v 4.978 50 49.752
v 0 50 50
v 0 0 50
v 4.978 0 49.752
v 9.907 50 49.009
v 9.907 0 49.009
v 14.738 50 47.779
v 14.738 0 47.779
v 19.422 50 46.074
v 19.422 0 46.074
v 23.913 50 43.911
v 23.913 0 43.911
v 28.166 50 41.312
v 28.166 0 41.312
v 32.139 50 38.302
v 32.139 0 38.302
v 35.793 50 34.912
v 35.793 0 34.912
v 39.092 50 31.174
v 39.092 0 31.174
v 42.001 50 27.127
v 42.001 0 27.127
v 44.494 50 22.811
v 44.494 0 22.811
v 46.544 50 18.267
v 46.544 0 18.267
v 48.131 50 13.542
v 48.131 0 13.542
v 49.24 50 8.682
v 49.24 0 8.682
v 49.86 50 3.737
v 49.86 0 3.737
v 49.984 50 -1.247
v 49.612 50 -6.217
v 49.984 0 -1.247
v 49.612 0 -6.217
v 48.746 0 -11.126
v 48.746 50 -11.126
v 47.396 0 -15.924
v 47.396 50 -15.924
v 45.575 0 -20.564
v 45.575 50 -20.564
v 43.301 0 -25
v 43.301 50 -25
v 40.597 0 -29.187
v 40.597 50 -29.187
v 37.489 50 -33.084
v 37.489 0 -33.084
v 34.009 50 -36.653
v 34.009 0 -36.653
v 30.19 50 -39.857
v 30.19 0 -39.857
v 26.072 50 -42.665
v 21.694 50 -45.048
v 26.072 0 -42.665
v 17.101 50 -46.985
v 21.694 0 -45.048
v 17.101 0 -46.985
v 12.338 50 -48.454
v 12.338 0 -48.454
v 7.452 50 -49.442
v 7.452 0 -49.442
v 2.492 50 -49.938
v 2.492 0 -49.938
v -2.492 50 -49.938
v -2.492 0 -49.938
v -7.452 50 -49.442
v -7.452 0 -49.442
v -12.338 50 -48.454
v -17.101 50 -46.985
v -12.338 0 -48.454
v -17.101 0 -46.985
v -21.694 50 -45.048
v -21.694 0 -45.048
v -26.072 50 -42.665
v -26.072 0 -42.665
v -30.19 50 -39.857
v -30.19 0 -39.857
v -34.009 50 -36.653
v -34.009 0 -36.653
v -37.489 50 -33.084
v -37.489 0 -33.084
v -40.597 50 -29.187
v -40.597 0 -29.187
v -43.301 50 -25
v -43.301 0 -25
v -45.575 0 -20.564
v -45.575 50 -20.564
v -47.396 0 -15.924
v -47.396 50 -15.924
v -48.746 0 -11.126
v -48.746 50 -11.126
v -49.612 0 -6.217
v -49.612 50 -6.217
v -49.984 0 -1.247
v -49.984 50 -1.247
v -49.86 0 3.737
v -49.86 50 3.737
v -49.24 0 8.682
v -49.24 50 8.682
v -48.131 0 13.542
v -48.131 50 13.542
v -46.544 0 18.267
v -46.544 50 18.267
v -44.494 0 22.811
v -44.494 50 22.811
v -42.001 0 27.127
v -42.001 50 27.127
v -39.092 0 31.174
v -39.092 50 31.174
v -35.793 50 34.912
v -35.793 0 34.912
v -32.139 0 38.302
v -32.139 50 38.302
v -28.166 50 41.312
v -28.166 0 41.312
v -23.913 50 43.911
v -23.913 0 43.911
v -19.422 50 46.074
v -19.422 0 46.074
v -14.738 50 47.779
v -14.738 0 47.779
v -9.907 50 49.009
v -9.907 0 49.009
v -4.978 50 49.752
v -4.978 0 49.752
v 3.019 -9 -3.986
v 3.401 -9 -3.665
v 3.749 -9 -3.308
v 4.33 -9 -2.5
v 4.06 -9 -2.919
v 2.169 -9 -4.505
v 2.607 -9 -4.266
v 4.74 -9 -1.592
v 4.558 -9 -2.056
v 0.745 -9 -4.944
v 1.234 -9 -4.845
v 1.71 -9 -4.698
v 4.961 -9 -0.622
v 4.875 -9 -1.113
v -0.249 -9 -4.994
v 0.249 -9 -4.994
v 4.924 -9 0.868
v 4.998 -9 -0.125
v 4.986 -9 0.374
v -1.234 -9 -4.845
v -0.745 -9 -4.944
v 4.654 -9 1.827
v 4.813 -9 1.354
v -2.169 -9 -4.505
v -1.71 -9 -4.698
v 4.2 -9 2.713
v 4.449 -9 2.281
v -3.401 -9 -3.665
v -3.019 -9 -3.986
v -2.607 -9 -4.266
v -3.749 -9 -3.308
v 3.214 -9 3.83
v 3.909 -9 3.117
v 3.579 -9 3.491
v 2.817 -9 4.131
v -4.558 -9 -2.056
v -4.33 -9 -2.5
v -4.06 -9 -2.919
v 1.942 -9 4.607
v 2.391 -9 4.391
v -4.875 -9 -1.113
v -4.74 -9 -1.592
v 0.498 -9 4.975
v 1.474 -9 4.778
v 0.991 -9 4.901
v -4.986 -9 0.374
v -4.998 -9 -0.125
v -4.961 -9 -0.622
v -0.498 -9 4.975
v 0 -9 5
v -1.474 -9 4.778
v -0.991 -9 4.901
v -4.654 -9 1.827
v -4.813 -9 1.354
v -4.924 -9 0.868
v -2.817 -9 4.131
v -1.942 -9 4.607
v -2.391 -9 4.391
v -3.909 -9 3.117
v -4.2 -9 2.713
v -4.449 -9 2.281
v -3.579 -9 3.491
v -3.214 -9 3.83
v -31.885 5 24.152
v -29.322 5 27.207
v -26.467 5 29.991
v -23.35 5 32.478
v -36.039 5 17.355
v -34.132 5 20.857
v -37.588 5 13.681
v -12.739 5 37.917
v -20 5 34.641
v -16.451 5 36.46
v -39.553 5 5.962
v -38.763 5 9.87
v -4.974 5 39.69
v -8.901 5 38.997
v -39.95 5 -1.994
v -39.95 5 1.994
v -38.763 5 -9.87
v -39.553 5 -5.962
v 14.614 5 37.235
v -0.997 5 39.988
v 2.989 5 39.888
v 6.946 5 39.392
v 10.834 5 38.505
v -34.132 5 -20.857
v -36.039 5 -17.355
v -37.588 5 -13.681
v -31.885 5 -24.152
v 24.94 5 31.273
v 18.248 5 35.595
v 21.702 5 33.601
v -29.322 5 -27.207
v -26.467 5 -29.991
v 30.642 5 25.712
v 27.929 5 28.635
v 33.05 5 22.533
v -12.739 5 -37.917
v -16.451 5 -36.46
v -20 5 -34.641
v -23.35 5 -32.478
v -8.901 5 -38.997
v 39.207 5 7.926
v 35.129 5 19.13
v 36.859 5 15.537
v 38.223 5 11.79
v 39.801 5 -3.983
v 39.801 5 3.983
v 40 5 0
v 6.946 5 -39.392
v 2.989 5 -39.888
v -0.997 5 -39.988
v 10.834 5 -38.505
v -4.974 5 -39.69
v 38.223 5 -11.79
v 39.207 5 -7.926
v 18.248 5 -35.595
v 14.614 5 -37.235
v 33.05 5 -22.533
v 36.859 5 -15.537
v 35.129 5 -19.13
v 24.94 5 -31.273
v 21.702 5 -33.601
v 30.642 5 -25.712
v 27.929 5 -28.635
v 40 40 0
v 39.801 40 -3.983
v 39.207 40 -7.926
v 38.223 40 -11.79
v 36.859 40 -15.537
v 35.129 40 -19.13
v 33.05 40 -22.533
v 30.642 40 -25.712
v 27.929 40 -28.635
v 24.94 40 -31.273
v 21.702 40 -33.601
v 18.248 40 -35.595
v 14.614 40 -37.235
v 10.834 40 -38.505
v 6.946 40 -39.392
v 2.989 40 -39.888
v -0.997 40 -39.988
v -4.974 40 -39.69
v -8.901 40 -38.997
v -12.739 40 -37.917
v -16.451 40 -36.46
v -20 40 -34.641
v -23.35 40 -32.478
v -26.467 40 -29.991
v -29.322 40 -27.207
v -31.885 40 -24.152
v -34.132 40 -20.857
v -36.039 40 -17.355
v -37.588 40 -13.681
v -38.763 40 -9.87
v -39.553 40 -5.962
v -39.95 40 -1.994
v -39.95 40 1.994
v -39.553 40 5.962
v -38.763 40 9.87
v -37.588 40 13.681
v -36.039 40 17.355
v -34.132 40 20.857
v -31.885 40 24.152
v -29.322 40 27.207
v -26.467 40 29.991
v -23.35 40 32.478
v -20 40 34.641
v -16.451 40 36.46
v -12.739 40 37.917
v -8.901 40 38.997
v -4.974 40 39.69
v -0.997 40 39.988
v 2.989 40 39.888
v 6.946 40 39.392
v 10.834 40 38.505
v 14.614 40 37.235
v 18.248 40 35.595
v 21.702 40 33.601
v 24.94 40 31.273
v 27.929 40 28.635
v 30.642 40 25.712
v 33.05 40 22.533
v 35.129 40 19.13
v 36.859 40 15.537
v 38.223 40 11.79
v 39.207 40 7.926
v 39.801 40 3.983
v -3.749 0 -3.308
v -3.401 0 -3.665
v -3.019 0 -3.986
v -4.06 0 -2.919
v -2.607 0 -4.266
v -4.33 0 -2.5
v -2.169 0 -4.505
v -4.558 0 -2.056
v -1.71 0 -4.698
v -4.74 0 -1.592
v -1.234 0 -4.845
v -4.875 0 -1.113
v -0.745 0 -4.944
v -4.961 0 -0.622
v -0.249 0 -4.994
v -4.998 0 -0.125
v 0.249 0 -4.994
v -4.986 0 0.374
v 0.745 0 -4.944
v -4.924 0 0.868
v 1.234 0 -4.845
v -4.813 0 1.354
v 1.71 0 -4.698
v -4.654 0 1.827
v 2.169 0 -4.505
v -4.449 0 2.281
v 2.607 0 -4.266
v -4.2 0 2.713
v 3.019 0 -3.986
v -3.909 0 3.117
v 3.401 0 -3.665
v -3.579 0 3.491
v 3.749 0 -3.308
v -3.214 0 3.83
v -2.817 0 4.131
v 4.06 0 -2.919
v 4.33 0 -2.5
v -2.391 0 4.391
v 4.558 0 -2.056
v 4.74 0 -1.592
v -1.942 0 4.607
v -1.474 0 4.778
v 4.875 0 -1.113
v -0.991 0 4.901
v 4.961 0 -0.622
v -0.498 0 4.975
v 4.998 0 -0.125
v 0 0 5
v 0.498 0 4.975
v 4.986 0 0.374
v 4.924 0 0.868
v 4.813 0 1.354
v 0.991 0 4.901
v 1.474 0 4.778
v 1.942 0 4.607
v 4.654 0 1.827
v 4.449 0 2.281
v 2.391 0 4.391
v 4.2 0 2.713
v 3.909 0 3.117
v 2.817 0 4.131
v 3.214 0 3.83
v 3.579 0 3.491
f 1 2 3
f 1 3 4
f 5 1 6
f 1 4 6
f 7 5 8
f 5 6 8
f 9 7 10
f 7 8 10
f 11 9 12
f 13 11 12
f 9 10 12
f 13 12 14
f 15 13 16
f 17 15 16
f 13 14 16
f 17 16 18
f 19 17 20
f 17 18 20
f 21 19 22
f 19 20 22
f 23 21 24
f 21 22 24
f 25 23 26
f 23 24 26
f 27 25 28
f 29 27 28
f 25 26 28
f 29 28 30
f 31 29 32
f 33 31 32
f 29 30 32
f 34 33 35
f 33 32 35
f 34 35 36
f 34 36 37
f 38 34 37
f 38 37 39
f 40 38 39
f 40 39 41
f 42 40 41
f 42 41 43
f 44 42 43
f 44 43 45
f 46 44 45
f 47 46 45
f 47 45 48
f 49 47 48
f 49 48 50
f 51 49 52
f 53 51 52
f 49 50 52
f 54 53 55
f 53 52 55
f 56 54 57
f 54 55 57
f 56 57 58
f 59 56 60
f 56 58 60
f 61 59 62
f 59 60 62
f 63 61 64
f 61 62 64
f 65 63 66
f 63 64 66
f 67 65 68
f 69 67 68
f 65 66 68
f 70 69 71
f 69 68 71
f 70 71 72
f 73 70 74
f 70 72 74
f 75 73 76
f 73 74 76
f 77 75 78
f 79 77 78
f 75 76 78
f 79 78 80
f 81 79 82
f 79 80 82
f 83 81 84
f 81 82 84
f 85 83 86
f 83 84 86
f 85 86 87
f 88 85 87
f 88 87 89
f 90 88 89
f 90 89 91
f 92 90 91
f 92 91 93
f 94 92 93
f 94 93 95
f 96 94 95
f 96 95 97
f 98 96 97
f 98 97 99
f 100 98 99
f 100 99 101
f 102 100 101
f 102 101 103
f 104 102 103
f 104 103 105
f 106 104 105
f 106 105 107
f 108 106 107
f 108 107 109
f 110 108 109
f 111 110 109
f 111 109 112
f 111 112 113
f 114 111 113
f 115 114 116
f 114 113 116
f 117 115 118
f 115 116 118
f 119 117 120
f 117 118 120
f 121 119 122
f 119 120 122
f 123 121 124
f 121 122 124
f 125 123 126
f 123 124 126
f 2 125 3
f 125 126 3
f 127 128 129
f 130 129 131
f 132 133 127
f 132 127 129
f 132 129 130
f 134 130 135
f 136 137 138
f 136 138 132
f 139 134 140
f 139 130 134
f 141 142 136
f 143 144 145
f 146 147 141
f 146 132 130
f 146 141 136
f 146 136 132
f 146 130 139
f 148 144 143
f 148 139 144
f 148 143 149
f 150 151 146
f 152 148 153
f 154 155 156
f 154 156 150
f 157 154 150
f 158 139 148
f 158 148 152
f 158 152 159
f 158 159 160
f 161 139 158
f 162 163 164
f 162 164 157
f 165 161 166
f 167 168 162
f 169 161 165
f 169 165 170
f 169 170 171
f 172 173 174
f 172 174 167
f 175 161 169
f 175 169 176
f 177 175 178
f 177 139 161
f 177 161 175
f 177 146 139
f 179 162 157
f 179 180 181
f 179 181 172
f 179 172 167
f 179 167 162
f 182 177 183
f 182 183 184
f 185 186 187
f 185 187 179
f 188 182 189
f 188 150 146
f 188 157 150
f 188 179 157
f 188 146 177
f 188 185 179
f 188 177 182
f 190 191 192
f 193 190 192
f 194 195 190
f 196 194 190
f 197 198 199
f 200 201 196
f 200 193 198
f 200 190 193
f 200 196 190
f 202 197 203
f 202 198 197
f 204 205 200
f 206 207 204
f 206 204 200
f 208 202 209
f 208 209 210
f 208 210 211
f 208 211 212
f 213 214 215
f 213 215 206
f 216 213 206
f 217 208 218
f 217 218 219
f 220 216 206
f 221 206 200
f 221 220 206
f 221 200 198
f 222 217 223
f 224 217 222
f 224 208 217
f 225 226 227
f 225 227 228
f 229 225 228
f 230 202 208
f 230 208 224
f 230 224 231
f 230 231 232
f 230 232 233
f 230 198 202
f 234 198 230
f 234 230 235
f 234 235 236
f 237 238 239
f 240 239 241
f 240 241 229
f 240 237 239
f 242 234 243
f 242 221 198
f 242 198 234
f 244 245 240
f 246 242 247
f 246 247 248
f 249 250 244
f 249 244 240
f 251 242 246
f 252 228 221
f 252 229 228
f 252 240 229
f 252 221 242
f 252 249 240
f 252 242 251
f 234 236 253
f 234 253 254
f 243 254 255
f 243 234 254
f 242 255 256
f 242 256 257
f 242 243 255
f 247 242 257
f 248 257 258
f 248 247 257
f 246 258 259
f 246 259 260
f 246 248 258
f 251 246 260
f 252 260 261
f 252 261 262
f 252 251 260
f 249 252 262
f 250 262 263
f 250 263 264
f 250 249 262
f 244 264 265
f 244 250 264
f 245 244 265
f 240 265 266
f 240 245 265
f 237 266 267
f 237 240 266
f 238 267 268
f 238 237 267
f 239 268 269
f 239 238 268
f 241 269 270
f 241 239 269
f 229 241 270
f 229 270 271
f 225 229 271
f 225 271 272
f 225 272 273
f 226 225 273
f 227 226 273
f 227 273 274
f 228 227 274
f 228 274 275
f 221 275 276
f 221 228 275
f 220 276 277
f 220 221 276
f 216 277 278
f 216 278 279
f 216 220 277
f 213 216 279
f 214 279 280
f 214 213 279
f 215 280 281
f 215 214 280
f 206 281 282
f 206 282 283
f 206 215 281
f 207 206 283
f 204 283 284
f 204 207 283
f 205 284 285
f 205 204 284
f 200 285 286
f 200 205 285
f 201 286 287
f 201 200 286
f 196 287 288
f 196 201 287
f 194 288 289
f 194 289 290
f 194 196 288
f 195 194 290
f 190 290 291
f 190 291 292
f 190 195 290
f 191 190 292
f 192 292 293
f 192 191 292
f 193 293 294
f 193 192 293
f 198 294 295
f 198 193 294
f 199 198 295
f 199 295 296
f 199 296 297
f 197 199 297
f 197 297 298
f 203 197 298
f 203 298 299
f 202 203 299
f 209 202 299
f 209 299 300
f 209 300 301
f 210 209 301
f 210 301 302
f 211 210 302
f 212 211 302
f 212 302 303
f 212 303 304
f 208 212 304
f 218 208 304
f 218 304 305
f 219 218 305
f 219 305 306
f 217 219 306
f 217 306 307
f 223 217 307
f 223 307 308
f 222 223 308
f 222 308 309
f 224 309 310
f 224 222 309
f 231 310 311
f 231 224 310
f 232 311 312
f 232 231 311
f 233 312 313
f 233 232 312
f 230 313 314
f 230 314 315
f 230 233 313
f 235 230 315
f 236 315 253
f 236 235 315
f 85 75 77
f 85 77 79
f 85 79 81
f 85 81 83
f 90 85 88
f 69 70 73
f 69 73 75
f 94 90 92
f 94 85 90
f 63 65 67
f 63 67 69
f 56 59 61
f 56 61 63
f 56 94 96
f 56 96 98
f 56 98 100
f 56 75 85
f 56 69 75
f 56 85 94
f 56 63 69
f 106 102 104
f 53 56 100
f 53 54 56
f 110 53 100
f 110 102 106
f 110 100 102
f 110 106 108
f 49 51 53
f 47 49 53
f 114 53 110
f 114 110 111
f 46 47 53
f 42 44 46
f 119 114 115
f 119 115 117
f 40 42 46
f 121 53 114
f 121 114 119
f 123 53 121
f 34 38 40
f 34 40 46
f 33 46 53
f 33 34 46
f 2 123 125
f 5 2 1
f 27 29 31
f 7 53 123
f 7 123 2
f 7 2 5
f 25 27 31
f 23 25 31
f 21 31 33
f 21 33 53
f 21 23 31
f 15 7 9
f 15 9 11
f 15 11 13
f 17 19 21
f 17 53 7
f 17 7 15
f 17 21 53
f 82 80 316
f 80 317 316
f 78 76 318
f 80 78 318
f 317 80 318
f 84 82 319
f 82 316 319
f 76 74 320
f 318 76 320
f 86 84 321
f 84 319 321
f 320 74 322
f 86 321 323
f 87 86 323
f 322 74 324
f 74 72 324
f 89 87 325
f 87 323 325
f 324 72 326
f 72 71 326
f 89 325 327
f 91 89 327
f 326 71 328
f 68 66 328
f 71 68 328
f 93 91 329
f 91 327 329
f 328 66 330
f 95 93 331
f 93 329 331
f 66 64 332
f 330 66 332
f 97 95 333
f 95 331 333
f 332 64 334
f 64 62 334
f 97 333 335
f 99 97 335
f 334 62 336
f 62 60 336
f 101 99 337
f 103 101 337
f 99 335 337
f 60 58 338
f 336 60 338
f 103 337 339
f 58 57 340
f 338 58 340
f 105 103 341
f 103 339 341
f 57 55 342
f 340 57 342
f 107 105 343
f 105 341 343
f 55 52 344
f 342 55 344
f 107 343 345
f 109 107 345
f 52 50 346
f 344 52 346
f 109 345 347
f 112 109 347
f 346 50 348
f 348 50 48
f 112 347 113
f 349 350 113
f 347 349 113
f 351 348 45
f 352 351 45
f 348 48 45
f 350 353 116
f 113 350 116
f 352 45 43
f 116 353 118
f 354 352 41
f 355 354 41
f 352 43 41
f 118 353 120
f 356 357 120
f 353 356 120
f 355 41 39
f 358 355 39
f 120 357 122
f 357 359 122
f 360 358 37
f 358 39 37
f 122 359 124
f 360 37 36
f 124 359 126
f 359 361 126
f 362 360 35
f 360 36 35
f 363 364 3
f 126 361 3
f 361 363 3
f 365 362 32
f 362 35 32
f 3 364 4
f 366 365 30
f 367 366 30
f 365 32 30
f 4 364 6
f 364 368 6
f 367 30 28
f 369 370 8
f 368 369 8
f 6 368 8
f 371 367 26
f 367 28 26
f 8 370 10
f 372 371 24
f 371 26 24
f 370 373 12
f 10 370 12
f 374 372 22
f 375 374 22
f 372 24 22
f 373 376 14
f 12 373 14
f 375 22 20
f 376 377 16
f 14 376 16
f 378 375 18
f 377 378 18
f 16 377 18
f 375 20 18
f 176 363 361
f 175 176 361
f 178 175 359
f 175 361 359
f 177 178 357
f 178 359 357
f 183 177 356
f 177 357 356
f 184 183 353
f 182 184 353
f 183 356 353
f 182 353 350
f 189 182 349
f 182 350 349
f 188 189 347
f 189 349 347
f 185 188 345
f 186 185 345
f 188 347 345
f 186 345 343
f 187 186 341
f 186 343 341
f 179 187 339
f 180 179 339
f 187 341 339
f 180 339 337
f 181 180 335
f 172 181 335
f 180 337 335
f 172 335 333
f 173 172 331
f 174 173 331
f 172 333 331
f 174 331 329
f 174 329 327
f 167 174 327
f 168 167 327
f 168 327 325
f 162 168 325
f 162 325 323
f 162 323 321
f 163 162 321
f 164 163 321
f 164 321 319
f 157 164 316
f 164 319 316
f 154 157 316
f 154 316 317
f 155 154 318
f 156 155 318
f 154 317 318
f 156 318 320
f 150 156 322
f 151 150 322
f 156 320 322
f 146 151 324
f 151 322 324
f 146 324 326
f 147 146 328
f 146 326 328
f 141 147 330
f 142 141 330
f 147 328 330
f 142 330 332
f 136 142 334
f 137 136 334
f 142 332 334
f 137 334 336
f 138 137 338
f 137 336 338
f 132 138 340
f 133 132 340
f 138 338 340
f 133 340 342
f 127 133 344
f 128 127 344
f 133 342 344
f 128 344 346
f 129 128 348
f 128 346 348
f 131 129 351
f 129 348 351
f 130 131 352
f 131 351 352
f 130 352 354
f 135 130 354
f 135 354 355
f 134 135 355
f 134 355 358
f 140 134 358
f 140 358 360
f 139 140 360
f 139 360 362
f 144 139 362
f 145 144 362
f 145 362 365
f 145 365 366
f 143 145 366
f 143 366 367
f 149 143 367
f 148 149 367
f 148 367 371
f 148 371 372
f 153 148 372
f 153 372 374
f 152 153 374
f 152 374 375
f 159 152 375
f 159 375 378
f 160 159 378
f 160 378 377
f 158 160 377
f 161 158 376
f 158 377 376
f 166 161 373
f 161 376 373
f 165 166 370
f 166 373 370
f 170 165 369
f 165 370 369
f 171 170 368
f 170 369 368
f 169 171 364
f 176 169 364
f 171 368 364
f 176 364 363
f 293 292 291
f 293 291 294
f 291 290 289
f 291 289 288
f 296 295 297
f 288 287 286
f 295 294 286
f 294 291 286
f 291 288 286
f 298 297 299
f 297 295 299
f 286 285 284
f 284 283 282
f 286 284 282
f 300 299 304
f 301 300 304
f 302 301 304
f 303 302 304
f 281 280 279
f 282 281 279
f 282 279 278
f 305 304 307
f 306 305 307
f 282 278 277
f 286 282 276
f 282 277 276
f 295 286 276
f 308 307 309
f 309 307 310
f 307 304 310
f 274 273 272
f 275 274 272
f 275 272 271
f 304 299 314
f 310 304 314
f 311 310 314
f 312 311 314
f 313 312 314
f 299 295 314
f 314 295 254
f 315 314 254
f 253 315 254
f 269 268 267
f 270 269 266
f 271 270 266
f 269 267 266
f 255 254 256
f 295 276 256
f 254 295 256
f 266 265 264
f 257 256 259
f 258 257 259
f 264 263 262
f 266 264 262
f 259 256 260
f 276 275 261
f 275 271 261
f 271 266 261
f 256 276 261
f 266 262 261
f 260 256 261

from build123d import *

# Parameters (mm, degrees)
SKETCH_1_R        = 50
EXTRUDE_1_DEPTH   = 50
SHELL_START       = 5
SHELL_1_OUTLINE_R = 40
SHELL_1_DEPTH     = 35
SKETCH_2_R        = 5
EXTRUDE_2_DEPTH   = 9


# Read off the part's stored shape, not the designer's step: 抽壳1
with BuildPart() as part:
    # 草图1 → 凸台-拉伸1 (new body)
    with BuildSketch(Plane(origin=(0, 0, 0), x_dir=(1, 0, 0), z_dir=(0, 1, 0))):
        with Locations(Location((0, 0, 0), (0, 0, 270))):
            Circle(SKETCH_1_R)
    extrude(amount=EXTRUDE_1_DEPTH)

    # 抽壳1 outline → 抽壳1 (cut)
    with BuildSketch(Plane(origin=(0, 0, 0), x_dir=(1, 0, 0), z_dir=(0, 1, 0)).offset(SHELL_START)):
        Circle(SHELL_1_OUTLINE_R)
    extrude(amount=SHELL_1_DEPTH, mode=Mode.SUBTRACT)

    # 草图2 → 凸台-拉伸2 (add)
    with BuildSketch(Plane.XZ):
        with Locations(Location((0, 0, 0), (0, 0, 90))):
            Circle(SKETCH_2_R)
    extrude(amount=EXTRUDE_2_DEPTH)


solid = part.part
